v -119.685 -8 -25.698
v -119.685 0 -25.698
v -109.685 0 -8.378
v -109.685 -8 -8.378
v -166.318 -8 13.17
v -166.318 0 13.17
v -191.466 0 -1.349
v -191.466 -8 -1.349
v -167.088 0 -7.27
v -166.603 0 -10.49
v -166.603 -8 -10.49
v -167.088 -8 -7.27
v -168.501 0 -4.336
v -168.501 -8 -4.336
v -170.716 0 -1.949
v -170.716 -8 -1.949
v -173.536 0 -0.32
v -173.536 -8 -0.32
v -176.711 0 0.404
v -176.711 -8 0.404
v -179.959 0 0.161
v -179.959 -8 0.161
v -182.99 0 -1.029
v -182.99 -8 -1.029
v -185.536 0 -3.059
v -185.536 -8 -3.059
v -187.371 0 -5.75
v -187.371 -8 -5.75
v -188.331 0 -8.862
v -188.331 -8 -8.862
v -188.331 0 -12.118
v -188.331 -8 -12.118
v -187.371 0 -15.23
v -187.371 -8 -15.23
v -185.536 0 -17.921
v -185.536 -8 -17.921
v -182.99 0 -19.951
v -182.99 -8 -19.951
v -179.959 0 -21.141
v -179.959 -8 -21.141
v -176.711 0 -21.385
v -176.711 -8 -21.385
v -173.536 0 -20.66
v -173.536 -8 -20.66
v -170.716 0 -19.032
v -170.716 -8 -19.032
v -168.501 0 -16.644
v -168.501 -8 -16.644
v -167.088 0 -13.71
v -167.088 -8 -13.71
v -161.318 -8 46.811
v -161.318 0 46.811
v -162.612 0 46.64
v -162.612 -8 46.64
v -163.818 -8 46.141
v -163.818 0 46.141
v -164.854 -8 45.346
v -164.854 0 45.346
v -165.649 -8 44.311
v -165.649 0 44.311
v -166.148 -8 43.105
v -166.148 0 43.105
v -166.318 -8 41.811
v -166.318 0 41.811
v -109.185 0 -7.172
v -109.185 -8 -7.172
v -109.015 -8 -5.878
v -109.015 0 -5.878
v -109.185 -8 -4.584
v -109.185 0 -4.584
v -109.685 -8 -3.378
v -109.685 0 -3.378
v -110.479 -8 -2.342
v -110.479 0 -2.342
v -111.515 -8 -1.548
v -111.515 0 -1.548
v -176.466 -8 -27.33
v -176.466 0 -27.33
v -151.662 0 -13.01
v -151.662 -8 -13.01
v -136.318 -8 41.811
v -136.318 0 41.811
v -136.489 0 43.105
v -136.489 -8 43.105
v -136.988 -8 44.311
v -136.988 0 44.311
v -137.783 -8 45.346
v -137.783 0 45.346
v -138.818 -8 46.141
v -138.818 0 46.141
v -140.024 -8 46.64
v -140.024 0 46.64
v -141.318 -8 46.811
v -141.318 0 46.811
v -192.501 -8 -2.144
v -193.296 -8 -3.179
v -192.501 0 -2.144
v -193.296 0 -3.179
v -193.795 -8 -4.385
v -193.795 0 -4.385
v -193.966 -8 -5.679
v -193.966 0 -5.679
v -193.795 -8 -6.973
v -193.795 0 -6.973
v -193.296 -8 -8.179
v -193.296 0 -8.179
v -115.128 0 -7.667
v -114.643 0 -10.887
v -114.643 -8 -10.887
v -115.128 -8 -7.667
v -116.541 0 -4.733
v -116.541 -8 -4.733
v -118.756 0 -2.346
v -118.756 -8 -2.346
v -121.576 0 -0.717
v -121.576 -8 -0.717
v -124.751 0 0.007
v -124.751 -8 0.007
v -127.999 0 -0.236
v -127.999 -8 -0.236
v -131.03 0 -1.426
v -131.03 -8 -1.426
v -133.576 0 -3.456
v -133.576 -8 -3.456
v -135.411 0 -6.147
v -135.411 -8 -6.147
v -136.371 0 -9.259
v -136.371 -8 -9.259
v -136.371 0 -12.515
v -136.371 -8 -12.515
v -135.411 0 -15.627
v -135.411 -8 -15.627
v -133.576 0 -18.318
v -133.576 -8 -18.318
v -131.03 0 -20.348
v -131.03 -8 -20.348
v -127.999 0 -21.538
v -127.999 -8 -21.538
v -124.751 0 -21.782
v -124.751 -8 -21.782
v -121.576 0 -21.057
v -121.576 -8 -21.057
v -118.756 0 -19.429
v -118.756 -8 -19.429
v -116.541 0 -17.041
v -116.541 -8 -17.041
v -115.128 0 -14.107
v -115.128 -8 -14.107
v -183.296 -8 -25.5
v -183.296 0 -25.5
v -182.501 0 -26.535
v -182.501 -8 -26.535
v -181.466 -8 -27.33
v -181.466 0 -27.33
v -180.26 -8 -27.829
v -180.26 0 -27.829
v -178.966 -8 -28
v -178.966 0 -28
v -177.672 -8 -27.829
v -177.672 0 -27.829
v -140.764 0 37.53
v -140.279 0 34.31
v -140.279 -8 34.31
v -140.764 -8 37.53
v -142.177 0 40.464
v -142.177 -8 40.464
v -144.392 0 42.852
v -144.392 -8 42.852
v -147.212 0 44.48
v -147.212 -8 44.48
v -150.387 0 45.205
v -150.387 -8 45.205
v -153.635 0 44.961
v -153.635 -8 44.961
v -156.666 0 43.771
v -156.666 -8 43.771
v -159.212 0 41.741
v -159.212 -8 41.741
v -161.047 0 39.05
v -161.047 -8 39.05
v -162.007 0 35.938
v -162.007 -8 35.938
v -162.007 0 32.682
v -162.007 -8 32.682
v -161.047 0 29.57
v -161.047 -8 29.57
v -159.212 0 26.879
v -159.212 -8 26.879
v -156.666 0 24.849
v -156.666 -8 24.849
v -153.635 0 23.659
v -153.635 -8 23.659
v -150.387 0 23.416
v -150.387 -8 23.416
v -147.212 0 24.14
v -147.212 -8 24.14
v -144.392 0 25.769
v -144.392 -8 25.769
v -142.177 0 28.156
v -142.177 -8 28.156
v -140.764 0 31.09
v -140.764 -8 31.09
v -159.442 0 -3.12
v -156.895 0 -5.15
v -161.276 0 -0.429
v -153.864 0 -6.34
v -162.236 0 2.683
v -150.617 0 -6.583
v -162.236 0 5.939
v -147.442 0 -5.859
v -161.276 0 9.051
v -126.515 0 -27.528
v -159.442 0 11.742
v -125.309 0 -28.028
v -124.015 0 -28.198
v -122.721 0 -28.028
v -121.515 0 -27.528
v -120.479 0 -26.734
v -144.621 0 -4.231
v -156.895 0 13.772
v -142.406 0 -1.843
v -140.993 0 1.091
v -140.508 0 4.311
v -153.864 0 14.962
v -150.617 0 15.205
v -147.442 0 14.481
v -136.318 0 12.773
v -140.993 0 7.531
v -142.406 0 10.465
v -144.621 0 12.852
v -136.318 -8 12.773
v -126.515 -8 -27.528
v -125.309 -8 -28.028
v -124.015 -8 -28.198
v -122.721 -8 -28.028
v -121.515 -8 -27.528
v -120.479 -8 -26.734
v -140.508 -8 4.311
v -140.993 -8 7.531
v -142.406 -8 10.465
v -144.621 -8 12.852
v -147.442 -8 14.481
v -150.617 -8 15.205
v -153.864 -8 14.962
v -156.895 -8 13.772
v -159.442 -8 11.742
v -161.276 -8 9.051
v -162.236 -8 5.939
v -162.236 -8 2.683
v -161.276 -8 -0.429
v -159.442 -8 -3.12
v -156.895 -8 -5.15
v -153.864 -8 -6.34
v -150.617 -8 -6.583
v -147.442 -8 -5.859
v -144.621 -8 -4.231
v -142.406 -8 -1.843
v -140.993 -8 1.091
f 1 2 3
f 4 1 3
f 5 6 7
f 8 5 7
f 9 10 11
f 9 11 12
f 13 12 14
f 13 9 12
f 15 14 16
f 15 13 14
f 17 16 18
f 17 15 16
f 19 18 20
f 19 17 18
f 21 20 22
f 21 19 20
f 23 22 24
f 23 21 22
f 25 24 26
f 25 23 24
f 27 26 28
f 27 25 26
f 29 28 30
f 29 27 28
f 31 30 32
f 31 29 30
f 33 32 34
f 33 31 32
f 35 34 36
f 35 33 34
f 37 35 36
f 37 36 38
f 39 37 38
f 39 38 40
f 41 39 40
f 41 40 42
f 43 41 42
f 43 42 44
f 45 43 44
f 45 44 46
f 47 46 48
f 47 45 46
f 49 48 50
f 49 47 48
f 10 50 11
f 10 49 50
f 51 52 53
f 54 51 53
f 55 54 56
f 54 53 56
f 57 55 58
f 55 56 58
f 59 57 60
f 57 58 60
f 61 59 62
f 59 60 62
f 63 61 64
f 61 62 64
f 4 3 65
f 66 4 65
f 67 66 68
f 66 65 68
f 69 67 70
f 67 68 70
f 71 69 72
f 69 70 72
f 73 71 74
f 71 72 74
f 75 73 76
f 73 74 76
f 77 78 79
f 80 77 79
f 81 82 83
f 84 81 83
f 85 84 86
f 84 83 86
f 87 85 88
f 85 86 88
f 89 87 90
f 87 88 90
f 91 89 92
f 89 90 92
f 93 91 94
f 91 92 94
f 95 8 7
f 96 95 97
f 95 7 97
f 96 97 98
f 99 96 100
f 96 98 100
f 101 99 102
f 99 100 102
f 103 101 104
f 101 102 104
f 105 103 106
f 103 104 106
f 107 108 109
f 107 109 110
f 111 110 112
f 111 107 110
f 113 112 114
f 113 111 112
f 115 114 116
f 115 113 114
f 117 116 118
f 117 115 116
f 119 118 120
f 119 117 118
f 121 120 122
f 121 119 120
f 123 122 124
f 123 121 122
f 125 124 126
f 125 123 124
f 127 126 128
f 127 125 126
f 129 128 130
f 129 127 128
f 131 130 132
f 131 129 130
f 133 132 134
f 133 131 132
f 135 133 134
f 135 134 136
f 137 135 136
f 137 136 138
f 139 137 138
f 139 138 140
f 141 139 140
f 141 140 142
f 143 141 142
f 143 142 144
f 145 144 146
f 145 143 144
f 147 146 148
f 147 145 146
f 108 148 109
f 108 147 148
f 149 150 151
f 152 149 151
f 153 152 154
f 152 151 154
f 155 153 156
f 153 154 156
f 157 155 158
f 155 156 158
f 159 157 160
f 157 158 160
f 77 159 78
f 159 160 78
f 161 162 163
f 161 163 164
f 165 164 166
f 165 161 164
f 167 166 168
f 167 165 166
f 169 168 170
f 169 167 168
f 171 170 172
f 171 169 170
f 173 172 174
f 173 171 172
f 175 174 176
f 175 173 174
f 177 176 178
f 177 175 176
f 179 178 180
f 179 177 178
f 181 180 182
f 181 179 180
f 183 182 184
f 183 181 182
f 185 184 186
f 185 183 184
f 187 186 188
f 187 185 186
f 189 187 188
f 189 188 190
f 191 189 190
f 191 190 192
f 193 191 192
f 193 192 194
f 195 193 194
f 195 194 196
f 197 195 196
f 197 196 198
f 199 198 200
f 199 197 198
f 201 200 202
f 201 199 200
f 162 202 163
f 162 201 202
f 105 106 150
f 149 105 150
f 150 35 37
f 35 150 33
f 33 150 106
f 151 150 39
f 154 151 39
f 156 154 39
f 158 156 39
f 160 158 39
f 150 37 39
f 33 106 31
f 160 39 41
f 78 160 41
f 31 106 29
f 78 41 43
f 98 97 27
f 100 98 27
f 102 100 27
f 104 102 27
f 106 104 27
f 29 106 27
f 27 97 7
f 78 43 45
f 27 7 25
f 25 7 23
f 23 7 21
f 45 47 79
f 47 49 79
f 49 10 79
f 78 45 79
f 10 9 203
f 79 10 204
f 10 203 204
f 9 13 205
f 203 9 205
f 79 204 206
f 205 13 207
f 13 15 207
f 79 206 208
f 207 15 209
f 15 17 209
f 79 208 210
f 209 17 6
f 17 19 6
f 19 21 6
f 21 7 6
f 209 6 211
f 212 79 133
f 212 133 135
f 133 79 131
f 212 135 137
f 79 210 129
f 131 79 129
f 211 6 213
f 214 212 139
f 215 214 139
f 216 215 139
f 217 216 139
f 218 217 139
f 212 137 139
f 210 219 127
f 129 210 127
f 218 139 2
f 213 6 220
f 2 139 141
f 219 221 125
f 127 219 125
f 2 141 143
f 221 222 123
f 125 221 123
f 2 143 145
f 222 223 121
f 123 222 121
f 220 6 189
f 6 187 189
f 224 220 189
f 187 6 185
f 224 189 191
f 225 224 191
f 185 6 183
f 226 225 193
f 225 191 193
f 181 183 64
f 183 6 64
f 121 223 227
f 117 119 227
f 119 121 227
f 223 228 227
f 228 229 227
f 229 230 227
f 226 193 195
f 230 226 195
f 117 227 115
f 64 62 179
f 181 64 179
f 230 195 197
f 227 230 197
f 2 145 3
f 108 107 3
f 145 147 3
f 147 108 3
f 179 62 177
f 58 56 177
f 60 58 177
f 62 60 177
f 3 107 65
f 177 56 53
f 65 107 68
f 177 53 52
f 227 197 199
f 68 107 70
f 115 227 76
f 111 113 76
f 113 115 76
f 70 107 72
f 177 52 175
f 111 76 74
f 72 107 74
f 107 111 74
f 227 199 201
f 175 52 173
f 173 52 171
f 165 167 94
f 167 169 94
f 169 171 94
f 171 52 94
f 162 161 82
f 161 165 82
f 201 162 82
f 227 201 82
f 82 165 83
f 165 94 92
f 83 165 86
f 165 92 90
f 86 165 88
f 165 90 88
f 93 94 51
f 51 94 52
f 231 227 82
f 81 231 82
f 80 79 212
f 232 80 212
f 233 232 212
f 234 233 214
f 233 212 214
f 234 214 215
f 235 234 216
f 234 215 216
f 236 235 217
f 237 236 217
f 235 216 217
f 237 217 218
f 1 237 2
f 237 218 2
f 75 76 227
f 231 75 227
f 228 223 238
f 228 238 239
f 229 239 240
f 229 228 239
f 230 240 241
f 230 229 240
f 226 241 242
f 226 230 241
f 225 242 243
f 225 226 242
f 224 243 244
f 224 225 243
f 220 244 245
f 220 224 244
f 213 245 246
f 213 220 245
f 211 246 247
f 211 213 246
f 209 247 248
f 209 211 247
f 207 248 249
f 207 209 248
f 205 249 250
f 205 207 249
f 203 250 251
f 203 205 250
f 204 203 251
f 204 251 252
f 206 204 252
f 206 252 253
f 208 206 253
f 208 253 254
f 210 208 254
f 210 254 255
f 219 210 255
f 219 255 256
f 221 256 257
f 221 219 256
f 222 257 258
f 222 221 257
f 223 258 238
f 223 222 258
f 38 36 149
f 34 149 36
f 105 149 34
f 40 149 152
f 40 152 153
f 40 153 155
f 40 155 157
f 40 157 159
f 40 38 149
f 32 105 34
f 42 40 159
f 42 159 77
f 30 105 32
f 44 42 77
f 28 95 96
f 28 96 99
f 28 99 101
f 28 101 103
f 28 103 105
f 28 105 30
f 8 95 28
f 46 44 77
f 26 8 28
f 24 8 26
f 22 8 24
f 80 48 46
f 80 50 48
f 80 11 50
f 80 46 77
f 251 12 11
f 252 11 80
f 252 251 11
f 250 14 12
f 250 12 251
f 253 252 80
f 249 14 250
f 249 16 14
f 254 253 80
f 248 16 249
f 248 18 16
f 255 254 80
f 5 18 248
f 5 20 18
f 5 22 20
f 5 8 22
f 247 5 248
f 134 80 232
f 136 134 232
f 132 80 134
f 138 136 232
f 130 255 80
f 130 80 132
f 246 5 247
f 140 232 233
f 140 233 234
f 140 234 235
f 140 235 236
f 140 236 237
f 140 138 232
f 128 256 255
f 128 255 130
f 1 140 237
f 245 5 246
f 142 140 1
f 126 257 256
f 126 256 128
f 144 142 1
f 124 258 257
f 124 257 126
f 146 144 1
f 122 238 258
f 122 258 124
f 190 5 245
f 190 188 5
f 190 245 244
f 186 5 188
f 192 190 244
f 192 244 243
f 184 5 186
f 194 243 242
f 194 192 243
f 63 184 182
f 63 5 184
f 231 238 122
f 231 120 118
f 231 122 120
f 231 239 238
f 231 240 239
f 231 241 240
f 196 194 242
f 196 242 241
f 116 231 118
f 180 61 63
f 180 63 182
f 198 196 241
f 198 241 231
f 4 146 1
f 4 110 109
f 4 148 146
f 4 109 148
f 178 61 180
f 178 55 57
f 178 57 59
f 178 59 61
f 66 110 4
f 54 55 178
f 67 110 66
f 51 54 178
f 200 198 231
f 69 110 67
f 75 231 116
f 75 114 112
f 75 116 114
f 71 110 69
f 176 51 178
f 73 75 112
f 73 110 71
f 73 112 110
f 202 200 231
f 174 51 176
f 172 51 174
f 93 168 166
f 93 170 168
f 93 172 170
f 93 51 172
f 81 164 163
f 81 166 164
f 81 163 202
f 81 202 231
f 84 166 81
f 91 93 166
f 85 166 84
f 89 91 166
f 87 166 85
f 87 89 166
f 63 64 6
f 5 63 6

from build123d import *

# Parameters (mm, degrees)
F0_R     = 10.925
F1_DEPTH = 8


with BuildPart() as f1:
    # F0 (on Front) → F1 (new body)
    with BuildSketch(Plane.XZ):
        with BuildLine():
            Line((-136.3183801476, -4.150791151), (-136.3183801476, -8.1894561753))
            Line((-136.3183801476, -8.1894561753), (-143.3135531644, -8.1894561753))
            Line((-143.3135531644, -8.1894561753), (-151.6621599046, -13.0095265241))
            Line((-151.6621599046, -13.0095265241), (-126.5146964668, -27.5284213094))
            ThreePointArc((-126.5146964668, -27.5284213094), (-122.7206012413, -28.027923422), (-119.6845694479, -25.6982942905))
            Line((-119.6845694479, -25.6982942905), (-109.6845694479, -8.3777862148))
            ThreePointArc((-109.6845694479, -8.3777862148), (-109.1850673353, -4.5836909893), (-111.5146964668, -1.5476591959))
            Line((-111.5146964668, -1.5476591959), (-136.3183801476, 12.7727542541))
            Line((-136.3183801476, 12.7727542541), (-136.3183801476, 3.1326135564))
            Line((-136.3183801476, 3.1326135564), (-133.1645733963, -2.3299399742))
            Line((-133.1645733963, -2.3299399742), (-136.3183801476, -4.150791151))
        make_face()
        with Locations((-125.5675627039, -10.8870620569)):
            Circle(F0_R, mode=Mode.SUBTRACT)
        Polygon((-144.6669868879, 17.592824603), (-136.3183801476, 3.1326135564), (-136.3183801476, 12.7727542541), align=None)
        Polygon((-157.9697734074, 17.9897872735), (-151.6621599046, 21.6314896272), (-154.815966656, 23.4523408041), align=None)
        with BuildLine():
            Line((-144.6669868879, 17.592824603), (-136.3183801476, 12.7727542541))
            Line((-136.3183801476, 12.7727542541), (-136.3183801476, 41.8105438247))
            ThreePointArc((-136.3183801476, 41.8105438247), (-137.7828462417, 45.3460777306), (-141.3183801476, 46.8105438247))
            Line((-141.3183801476, 46.8105438247), (-161.3183801476, 46.8105438247))
            ThreePointArc((-161.3183801476, 46.8105438247), (-164.8539140536, 45.3460777306), (-166.3183801476, 41.8105438247))
            Line((-166.3183801476, 41.8105438247), (-166.3183801476, 13.1697169246))
            Line((-166.3183801476, 13.1697169246), (-157.9697734074, 17.9897872735))
            Line((-157.9697734074, 17.9897872735), (-154.815966656, 23.4523408041))
            Line((-154.815966656, 23.4523408041), (-151.6621599046, 21.6314896272))
            Line((-151.6621599046, 21.6314896272), (-148.1645733963, 23.6508221394))
            Line((-148.1645733963, 23.6508221394), (-144.6669868879, 17.592824603))
        make_face()
        with Locations((-151.2037868953, 34.3101060979)):
            Circle(F0_R, mode=Mode.SUBTRACT)
        Polygon((-166.3183801476, 13.1697169246), (-166.3183801476, 3.5295762269), (-157.9697734074, 17.9897872735), align=None)
        with BuildLine():
            Line((-151.6621599046, -13.0095265241), (-160.0107666449, -8.1894561753))
            Line((-160.0107666449, -8.1894561753), (-166.3183801476, -8.1894561753))
            Line((-166.3183801476, -8.1894561753), (-166.3183801476, -4.5477538216))
            Line((-166.3183801476, -4.5477538216), (-169.815966656, -2.5284213094))
            Line((-169.815966656, -2.5284213094), (-166.3183801476, 3.5295762269))
            Line((-166.3183801476, 3.5295762269), (-166.3183801476, 13.1697169246))
            Line((-166.3183801476, 13.1697169246), (-191.4658435855, -1.3491778606))
            ThreePointArc((-191.4658435855, -1.3491778606), (-193.7954727169, -4.3852096541), (-193.2959706044, -8.1793048796))
            Line((-193.2959706044, -8.1793048796), (-183.2959706044, -25.4998129553))
            ThreePointArc((-183.2959706044, -25.4998129553), (-180.259938811, -27.8294420867), (-176.4658435855, -27.3299399742))
            Line((-176.4658435855, -27.3299399742), (-151.6621599046, -13.0095265241))
        make_face()
        with Locations((-177.5275706007, -10.4900993864)):
            Circle(F0_R, mode=Mode.SUBTRACT)
        Polygon((-160.0107666449, -8.1894561753), (-143.3135531644, -8.1894561753), (-136.3183801476, -4.150791151), (-136.3183801476, 3.1326135564), (-144.6669868879, 17.592824603), (-151.6621599046, 21.6314896272), (-157.9697734074, 17.9897872735), (-166.3183801476, 3.5295762269), (-166.3183801476, -4.5477538216), align=None)
        with Locations((-151.4329734, 4.3109815515)):
            Circle(F0_R, mode=Mode.SUBTRACT)
        Polygon((-169.815966656, -2.5284213094), (-166.3183801476, -4.5477538216), (-166.3183801476, 3.5295762269), align=None)
        Polygon((-151.6621599046, 21.6314896272), (-144.6669868879, 17.592824603), (-148.1645733963, 23.6508221394), align=None)
        Polygon((-136.3183801476, 3.1326135564), (-136.3183801476, -4.150791151), (-133.1645733963, -2.3299399742), align=None)
        Polygon((-143.3135531644, -8.1894561753), (-136.3183801476, -8.1894561753), (-136.3183801476, -4.150791151), align=None)
        Polygon((-166.3183801476, -8.1894561753), (-160.0107666449, -8.1894561753), (-166.3183801476, -4.5477538216), align=None)
        Polygon((-151.6621599046, -13.0095265241), (-143.3135531644, -8.1894561753), (-160.0107666449, -8.1894561753), align=None)
    extrude(amount=F1_DEPTH)


solid = f1.part
